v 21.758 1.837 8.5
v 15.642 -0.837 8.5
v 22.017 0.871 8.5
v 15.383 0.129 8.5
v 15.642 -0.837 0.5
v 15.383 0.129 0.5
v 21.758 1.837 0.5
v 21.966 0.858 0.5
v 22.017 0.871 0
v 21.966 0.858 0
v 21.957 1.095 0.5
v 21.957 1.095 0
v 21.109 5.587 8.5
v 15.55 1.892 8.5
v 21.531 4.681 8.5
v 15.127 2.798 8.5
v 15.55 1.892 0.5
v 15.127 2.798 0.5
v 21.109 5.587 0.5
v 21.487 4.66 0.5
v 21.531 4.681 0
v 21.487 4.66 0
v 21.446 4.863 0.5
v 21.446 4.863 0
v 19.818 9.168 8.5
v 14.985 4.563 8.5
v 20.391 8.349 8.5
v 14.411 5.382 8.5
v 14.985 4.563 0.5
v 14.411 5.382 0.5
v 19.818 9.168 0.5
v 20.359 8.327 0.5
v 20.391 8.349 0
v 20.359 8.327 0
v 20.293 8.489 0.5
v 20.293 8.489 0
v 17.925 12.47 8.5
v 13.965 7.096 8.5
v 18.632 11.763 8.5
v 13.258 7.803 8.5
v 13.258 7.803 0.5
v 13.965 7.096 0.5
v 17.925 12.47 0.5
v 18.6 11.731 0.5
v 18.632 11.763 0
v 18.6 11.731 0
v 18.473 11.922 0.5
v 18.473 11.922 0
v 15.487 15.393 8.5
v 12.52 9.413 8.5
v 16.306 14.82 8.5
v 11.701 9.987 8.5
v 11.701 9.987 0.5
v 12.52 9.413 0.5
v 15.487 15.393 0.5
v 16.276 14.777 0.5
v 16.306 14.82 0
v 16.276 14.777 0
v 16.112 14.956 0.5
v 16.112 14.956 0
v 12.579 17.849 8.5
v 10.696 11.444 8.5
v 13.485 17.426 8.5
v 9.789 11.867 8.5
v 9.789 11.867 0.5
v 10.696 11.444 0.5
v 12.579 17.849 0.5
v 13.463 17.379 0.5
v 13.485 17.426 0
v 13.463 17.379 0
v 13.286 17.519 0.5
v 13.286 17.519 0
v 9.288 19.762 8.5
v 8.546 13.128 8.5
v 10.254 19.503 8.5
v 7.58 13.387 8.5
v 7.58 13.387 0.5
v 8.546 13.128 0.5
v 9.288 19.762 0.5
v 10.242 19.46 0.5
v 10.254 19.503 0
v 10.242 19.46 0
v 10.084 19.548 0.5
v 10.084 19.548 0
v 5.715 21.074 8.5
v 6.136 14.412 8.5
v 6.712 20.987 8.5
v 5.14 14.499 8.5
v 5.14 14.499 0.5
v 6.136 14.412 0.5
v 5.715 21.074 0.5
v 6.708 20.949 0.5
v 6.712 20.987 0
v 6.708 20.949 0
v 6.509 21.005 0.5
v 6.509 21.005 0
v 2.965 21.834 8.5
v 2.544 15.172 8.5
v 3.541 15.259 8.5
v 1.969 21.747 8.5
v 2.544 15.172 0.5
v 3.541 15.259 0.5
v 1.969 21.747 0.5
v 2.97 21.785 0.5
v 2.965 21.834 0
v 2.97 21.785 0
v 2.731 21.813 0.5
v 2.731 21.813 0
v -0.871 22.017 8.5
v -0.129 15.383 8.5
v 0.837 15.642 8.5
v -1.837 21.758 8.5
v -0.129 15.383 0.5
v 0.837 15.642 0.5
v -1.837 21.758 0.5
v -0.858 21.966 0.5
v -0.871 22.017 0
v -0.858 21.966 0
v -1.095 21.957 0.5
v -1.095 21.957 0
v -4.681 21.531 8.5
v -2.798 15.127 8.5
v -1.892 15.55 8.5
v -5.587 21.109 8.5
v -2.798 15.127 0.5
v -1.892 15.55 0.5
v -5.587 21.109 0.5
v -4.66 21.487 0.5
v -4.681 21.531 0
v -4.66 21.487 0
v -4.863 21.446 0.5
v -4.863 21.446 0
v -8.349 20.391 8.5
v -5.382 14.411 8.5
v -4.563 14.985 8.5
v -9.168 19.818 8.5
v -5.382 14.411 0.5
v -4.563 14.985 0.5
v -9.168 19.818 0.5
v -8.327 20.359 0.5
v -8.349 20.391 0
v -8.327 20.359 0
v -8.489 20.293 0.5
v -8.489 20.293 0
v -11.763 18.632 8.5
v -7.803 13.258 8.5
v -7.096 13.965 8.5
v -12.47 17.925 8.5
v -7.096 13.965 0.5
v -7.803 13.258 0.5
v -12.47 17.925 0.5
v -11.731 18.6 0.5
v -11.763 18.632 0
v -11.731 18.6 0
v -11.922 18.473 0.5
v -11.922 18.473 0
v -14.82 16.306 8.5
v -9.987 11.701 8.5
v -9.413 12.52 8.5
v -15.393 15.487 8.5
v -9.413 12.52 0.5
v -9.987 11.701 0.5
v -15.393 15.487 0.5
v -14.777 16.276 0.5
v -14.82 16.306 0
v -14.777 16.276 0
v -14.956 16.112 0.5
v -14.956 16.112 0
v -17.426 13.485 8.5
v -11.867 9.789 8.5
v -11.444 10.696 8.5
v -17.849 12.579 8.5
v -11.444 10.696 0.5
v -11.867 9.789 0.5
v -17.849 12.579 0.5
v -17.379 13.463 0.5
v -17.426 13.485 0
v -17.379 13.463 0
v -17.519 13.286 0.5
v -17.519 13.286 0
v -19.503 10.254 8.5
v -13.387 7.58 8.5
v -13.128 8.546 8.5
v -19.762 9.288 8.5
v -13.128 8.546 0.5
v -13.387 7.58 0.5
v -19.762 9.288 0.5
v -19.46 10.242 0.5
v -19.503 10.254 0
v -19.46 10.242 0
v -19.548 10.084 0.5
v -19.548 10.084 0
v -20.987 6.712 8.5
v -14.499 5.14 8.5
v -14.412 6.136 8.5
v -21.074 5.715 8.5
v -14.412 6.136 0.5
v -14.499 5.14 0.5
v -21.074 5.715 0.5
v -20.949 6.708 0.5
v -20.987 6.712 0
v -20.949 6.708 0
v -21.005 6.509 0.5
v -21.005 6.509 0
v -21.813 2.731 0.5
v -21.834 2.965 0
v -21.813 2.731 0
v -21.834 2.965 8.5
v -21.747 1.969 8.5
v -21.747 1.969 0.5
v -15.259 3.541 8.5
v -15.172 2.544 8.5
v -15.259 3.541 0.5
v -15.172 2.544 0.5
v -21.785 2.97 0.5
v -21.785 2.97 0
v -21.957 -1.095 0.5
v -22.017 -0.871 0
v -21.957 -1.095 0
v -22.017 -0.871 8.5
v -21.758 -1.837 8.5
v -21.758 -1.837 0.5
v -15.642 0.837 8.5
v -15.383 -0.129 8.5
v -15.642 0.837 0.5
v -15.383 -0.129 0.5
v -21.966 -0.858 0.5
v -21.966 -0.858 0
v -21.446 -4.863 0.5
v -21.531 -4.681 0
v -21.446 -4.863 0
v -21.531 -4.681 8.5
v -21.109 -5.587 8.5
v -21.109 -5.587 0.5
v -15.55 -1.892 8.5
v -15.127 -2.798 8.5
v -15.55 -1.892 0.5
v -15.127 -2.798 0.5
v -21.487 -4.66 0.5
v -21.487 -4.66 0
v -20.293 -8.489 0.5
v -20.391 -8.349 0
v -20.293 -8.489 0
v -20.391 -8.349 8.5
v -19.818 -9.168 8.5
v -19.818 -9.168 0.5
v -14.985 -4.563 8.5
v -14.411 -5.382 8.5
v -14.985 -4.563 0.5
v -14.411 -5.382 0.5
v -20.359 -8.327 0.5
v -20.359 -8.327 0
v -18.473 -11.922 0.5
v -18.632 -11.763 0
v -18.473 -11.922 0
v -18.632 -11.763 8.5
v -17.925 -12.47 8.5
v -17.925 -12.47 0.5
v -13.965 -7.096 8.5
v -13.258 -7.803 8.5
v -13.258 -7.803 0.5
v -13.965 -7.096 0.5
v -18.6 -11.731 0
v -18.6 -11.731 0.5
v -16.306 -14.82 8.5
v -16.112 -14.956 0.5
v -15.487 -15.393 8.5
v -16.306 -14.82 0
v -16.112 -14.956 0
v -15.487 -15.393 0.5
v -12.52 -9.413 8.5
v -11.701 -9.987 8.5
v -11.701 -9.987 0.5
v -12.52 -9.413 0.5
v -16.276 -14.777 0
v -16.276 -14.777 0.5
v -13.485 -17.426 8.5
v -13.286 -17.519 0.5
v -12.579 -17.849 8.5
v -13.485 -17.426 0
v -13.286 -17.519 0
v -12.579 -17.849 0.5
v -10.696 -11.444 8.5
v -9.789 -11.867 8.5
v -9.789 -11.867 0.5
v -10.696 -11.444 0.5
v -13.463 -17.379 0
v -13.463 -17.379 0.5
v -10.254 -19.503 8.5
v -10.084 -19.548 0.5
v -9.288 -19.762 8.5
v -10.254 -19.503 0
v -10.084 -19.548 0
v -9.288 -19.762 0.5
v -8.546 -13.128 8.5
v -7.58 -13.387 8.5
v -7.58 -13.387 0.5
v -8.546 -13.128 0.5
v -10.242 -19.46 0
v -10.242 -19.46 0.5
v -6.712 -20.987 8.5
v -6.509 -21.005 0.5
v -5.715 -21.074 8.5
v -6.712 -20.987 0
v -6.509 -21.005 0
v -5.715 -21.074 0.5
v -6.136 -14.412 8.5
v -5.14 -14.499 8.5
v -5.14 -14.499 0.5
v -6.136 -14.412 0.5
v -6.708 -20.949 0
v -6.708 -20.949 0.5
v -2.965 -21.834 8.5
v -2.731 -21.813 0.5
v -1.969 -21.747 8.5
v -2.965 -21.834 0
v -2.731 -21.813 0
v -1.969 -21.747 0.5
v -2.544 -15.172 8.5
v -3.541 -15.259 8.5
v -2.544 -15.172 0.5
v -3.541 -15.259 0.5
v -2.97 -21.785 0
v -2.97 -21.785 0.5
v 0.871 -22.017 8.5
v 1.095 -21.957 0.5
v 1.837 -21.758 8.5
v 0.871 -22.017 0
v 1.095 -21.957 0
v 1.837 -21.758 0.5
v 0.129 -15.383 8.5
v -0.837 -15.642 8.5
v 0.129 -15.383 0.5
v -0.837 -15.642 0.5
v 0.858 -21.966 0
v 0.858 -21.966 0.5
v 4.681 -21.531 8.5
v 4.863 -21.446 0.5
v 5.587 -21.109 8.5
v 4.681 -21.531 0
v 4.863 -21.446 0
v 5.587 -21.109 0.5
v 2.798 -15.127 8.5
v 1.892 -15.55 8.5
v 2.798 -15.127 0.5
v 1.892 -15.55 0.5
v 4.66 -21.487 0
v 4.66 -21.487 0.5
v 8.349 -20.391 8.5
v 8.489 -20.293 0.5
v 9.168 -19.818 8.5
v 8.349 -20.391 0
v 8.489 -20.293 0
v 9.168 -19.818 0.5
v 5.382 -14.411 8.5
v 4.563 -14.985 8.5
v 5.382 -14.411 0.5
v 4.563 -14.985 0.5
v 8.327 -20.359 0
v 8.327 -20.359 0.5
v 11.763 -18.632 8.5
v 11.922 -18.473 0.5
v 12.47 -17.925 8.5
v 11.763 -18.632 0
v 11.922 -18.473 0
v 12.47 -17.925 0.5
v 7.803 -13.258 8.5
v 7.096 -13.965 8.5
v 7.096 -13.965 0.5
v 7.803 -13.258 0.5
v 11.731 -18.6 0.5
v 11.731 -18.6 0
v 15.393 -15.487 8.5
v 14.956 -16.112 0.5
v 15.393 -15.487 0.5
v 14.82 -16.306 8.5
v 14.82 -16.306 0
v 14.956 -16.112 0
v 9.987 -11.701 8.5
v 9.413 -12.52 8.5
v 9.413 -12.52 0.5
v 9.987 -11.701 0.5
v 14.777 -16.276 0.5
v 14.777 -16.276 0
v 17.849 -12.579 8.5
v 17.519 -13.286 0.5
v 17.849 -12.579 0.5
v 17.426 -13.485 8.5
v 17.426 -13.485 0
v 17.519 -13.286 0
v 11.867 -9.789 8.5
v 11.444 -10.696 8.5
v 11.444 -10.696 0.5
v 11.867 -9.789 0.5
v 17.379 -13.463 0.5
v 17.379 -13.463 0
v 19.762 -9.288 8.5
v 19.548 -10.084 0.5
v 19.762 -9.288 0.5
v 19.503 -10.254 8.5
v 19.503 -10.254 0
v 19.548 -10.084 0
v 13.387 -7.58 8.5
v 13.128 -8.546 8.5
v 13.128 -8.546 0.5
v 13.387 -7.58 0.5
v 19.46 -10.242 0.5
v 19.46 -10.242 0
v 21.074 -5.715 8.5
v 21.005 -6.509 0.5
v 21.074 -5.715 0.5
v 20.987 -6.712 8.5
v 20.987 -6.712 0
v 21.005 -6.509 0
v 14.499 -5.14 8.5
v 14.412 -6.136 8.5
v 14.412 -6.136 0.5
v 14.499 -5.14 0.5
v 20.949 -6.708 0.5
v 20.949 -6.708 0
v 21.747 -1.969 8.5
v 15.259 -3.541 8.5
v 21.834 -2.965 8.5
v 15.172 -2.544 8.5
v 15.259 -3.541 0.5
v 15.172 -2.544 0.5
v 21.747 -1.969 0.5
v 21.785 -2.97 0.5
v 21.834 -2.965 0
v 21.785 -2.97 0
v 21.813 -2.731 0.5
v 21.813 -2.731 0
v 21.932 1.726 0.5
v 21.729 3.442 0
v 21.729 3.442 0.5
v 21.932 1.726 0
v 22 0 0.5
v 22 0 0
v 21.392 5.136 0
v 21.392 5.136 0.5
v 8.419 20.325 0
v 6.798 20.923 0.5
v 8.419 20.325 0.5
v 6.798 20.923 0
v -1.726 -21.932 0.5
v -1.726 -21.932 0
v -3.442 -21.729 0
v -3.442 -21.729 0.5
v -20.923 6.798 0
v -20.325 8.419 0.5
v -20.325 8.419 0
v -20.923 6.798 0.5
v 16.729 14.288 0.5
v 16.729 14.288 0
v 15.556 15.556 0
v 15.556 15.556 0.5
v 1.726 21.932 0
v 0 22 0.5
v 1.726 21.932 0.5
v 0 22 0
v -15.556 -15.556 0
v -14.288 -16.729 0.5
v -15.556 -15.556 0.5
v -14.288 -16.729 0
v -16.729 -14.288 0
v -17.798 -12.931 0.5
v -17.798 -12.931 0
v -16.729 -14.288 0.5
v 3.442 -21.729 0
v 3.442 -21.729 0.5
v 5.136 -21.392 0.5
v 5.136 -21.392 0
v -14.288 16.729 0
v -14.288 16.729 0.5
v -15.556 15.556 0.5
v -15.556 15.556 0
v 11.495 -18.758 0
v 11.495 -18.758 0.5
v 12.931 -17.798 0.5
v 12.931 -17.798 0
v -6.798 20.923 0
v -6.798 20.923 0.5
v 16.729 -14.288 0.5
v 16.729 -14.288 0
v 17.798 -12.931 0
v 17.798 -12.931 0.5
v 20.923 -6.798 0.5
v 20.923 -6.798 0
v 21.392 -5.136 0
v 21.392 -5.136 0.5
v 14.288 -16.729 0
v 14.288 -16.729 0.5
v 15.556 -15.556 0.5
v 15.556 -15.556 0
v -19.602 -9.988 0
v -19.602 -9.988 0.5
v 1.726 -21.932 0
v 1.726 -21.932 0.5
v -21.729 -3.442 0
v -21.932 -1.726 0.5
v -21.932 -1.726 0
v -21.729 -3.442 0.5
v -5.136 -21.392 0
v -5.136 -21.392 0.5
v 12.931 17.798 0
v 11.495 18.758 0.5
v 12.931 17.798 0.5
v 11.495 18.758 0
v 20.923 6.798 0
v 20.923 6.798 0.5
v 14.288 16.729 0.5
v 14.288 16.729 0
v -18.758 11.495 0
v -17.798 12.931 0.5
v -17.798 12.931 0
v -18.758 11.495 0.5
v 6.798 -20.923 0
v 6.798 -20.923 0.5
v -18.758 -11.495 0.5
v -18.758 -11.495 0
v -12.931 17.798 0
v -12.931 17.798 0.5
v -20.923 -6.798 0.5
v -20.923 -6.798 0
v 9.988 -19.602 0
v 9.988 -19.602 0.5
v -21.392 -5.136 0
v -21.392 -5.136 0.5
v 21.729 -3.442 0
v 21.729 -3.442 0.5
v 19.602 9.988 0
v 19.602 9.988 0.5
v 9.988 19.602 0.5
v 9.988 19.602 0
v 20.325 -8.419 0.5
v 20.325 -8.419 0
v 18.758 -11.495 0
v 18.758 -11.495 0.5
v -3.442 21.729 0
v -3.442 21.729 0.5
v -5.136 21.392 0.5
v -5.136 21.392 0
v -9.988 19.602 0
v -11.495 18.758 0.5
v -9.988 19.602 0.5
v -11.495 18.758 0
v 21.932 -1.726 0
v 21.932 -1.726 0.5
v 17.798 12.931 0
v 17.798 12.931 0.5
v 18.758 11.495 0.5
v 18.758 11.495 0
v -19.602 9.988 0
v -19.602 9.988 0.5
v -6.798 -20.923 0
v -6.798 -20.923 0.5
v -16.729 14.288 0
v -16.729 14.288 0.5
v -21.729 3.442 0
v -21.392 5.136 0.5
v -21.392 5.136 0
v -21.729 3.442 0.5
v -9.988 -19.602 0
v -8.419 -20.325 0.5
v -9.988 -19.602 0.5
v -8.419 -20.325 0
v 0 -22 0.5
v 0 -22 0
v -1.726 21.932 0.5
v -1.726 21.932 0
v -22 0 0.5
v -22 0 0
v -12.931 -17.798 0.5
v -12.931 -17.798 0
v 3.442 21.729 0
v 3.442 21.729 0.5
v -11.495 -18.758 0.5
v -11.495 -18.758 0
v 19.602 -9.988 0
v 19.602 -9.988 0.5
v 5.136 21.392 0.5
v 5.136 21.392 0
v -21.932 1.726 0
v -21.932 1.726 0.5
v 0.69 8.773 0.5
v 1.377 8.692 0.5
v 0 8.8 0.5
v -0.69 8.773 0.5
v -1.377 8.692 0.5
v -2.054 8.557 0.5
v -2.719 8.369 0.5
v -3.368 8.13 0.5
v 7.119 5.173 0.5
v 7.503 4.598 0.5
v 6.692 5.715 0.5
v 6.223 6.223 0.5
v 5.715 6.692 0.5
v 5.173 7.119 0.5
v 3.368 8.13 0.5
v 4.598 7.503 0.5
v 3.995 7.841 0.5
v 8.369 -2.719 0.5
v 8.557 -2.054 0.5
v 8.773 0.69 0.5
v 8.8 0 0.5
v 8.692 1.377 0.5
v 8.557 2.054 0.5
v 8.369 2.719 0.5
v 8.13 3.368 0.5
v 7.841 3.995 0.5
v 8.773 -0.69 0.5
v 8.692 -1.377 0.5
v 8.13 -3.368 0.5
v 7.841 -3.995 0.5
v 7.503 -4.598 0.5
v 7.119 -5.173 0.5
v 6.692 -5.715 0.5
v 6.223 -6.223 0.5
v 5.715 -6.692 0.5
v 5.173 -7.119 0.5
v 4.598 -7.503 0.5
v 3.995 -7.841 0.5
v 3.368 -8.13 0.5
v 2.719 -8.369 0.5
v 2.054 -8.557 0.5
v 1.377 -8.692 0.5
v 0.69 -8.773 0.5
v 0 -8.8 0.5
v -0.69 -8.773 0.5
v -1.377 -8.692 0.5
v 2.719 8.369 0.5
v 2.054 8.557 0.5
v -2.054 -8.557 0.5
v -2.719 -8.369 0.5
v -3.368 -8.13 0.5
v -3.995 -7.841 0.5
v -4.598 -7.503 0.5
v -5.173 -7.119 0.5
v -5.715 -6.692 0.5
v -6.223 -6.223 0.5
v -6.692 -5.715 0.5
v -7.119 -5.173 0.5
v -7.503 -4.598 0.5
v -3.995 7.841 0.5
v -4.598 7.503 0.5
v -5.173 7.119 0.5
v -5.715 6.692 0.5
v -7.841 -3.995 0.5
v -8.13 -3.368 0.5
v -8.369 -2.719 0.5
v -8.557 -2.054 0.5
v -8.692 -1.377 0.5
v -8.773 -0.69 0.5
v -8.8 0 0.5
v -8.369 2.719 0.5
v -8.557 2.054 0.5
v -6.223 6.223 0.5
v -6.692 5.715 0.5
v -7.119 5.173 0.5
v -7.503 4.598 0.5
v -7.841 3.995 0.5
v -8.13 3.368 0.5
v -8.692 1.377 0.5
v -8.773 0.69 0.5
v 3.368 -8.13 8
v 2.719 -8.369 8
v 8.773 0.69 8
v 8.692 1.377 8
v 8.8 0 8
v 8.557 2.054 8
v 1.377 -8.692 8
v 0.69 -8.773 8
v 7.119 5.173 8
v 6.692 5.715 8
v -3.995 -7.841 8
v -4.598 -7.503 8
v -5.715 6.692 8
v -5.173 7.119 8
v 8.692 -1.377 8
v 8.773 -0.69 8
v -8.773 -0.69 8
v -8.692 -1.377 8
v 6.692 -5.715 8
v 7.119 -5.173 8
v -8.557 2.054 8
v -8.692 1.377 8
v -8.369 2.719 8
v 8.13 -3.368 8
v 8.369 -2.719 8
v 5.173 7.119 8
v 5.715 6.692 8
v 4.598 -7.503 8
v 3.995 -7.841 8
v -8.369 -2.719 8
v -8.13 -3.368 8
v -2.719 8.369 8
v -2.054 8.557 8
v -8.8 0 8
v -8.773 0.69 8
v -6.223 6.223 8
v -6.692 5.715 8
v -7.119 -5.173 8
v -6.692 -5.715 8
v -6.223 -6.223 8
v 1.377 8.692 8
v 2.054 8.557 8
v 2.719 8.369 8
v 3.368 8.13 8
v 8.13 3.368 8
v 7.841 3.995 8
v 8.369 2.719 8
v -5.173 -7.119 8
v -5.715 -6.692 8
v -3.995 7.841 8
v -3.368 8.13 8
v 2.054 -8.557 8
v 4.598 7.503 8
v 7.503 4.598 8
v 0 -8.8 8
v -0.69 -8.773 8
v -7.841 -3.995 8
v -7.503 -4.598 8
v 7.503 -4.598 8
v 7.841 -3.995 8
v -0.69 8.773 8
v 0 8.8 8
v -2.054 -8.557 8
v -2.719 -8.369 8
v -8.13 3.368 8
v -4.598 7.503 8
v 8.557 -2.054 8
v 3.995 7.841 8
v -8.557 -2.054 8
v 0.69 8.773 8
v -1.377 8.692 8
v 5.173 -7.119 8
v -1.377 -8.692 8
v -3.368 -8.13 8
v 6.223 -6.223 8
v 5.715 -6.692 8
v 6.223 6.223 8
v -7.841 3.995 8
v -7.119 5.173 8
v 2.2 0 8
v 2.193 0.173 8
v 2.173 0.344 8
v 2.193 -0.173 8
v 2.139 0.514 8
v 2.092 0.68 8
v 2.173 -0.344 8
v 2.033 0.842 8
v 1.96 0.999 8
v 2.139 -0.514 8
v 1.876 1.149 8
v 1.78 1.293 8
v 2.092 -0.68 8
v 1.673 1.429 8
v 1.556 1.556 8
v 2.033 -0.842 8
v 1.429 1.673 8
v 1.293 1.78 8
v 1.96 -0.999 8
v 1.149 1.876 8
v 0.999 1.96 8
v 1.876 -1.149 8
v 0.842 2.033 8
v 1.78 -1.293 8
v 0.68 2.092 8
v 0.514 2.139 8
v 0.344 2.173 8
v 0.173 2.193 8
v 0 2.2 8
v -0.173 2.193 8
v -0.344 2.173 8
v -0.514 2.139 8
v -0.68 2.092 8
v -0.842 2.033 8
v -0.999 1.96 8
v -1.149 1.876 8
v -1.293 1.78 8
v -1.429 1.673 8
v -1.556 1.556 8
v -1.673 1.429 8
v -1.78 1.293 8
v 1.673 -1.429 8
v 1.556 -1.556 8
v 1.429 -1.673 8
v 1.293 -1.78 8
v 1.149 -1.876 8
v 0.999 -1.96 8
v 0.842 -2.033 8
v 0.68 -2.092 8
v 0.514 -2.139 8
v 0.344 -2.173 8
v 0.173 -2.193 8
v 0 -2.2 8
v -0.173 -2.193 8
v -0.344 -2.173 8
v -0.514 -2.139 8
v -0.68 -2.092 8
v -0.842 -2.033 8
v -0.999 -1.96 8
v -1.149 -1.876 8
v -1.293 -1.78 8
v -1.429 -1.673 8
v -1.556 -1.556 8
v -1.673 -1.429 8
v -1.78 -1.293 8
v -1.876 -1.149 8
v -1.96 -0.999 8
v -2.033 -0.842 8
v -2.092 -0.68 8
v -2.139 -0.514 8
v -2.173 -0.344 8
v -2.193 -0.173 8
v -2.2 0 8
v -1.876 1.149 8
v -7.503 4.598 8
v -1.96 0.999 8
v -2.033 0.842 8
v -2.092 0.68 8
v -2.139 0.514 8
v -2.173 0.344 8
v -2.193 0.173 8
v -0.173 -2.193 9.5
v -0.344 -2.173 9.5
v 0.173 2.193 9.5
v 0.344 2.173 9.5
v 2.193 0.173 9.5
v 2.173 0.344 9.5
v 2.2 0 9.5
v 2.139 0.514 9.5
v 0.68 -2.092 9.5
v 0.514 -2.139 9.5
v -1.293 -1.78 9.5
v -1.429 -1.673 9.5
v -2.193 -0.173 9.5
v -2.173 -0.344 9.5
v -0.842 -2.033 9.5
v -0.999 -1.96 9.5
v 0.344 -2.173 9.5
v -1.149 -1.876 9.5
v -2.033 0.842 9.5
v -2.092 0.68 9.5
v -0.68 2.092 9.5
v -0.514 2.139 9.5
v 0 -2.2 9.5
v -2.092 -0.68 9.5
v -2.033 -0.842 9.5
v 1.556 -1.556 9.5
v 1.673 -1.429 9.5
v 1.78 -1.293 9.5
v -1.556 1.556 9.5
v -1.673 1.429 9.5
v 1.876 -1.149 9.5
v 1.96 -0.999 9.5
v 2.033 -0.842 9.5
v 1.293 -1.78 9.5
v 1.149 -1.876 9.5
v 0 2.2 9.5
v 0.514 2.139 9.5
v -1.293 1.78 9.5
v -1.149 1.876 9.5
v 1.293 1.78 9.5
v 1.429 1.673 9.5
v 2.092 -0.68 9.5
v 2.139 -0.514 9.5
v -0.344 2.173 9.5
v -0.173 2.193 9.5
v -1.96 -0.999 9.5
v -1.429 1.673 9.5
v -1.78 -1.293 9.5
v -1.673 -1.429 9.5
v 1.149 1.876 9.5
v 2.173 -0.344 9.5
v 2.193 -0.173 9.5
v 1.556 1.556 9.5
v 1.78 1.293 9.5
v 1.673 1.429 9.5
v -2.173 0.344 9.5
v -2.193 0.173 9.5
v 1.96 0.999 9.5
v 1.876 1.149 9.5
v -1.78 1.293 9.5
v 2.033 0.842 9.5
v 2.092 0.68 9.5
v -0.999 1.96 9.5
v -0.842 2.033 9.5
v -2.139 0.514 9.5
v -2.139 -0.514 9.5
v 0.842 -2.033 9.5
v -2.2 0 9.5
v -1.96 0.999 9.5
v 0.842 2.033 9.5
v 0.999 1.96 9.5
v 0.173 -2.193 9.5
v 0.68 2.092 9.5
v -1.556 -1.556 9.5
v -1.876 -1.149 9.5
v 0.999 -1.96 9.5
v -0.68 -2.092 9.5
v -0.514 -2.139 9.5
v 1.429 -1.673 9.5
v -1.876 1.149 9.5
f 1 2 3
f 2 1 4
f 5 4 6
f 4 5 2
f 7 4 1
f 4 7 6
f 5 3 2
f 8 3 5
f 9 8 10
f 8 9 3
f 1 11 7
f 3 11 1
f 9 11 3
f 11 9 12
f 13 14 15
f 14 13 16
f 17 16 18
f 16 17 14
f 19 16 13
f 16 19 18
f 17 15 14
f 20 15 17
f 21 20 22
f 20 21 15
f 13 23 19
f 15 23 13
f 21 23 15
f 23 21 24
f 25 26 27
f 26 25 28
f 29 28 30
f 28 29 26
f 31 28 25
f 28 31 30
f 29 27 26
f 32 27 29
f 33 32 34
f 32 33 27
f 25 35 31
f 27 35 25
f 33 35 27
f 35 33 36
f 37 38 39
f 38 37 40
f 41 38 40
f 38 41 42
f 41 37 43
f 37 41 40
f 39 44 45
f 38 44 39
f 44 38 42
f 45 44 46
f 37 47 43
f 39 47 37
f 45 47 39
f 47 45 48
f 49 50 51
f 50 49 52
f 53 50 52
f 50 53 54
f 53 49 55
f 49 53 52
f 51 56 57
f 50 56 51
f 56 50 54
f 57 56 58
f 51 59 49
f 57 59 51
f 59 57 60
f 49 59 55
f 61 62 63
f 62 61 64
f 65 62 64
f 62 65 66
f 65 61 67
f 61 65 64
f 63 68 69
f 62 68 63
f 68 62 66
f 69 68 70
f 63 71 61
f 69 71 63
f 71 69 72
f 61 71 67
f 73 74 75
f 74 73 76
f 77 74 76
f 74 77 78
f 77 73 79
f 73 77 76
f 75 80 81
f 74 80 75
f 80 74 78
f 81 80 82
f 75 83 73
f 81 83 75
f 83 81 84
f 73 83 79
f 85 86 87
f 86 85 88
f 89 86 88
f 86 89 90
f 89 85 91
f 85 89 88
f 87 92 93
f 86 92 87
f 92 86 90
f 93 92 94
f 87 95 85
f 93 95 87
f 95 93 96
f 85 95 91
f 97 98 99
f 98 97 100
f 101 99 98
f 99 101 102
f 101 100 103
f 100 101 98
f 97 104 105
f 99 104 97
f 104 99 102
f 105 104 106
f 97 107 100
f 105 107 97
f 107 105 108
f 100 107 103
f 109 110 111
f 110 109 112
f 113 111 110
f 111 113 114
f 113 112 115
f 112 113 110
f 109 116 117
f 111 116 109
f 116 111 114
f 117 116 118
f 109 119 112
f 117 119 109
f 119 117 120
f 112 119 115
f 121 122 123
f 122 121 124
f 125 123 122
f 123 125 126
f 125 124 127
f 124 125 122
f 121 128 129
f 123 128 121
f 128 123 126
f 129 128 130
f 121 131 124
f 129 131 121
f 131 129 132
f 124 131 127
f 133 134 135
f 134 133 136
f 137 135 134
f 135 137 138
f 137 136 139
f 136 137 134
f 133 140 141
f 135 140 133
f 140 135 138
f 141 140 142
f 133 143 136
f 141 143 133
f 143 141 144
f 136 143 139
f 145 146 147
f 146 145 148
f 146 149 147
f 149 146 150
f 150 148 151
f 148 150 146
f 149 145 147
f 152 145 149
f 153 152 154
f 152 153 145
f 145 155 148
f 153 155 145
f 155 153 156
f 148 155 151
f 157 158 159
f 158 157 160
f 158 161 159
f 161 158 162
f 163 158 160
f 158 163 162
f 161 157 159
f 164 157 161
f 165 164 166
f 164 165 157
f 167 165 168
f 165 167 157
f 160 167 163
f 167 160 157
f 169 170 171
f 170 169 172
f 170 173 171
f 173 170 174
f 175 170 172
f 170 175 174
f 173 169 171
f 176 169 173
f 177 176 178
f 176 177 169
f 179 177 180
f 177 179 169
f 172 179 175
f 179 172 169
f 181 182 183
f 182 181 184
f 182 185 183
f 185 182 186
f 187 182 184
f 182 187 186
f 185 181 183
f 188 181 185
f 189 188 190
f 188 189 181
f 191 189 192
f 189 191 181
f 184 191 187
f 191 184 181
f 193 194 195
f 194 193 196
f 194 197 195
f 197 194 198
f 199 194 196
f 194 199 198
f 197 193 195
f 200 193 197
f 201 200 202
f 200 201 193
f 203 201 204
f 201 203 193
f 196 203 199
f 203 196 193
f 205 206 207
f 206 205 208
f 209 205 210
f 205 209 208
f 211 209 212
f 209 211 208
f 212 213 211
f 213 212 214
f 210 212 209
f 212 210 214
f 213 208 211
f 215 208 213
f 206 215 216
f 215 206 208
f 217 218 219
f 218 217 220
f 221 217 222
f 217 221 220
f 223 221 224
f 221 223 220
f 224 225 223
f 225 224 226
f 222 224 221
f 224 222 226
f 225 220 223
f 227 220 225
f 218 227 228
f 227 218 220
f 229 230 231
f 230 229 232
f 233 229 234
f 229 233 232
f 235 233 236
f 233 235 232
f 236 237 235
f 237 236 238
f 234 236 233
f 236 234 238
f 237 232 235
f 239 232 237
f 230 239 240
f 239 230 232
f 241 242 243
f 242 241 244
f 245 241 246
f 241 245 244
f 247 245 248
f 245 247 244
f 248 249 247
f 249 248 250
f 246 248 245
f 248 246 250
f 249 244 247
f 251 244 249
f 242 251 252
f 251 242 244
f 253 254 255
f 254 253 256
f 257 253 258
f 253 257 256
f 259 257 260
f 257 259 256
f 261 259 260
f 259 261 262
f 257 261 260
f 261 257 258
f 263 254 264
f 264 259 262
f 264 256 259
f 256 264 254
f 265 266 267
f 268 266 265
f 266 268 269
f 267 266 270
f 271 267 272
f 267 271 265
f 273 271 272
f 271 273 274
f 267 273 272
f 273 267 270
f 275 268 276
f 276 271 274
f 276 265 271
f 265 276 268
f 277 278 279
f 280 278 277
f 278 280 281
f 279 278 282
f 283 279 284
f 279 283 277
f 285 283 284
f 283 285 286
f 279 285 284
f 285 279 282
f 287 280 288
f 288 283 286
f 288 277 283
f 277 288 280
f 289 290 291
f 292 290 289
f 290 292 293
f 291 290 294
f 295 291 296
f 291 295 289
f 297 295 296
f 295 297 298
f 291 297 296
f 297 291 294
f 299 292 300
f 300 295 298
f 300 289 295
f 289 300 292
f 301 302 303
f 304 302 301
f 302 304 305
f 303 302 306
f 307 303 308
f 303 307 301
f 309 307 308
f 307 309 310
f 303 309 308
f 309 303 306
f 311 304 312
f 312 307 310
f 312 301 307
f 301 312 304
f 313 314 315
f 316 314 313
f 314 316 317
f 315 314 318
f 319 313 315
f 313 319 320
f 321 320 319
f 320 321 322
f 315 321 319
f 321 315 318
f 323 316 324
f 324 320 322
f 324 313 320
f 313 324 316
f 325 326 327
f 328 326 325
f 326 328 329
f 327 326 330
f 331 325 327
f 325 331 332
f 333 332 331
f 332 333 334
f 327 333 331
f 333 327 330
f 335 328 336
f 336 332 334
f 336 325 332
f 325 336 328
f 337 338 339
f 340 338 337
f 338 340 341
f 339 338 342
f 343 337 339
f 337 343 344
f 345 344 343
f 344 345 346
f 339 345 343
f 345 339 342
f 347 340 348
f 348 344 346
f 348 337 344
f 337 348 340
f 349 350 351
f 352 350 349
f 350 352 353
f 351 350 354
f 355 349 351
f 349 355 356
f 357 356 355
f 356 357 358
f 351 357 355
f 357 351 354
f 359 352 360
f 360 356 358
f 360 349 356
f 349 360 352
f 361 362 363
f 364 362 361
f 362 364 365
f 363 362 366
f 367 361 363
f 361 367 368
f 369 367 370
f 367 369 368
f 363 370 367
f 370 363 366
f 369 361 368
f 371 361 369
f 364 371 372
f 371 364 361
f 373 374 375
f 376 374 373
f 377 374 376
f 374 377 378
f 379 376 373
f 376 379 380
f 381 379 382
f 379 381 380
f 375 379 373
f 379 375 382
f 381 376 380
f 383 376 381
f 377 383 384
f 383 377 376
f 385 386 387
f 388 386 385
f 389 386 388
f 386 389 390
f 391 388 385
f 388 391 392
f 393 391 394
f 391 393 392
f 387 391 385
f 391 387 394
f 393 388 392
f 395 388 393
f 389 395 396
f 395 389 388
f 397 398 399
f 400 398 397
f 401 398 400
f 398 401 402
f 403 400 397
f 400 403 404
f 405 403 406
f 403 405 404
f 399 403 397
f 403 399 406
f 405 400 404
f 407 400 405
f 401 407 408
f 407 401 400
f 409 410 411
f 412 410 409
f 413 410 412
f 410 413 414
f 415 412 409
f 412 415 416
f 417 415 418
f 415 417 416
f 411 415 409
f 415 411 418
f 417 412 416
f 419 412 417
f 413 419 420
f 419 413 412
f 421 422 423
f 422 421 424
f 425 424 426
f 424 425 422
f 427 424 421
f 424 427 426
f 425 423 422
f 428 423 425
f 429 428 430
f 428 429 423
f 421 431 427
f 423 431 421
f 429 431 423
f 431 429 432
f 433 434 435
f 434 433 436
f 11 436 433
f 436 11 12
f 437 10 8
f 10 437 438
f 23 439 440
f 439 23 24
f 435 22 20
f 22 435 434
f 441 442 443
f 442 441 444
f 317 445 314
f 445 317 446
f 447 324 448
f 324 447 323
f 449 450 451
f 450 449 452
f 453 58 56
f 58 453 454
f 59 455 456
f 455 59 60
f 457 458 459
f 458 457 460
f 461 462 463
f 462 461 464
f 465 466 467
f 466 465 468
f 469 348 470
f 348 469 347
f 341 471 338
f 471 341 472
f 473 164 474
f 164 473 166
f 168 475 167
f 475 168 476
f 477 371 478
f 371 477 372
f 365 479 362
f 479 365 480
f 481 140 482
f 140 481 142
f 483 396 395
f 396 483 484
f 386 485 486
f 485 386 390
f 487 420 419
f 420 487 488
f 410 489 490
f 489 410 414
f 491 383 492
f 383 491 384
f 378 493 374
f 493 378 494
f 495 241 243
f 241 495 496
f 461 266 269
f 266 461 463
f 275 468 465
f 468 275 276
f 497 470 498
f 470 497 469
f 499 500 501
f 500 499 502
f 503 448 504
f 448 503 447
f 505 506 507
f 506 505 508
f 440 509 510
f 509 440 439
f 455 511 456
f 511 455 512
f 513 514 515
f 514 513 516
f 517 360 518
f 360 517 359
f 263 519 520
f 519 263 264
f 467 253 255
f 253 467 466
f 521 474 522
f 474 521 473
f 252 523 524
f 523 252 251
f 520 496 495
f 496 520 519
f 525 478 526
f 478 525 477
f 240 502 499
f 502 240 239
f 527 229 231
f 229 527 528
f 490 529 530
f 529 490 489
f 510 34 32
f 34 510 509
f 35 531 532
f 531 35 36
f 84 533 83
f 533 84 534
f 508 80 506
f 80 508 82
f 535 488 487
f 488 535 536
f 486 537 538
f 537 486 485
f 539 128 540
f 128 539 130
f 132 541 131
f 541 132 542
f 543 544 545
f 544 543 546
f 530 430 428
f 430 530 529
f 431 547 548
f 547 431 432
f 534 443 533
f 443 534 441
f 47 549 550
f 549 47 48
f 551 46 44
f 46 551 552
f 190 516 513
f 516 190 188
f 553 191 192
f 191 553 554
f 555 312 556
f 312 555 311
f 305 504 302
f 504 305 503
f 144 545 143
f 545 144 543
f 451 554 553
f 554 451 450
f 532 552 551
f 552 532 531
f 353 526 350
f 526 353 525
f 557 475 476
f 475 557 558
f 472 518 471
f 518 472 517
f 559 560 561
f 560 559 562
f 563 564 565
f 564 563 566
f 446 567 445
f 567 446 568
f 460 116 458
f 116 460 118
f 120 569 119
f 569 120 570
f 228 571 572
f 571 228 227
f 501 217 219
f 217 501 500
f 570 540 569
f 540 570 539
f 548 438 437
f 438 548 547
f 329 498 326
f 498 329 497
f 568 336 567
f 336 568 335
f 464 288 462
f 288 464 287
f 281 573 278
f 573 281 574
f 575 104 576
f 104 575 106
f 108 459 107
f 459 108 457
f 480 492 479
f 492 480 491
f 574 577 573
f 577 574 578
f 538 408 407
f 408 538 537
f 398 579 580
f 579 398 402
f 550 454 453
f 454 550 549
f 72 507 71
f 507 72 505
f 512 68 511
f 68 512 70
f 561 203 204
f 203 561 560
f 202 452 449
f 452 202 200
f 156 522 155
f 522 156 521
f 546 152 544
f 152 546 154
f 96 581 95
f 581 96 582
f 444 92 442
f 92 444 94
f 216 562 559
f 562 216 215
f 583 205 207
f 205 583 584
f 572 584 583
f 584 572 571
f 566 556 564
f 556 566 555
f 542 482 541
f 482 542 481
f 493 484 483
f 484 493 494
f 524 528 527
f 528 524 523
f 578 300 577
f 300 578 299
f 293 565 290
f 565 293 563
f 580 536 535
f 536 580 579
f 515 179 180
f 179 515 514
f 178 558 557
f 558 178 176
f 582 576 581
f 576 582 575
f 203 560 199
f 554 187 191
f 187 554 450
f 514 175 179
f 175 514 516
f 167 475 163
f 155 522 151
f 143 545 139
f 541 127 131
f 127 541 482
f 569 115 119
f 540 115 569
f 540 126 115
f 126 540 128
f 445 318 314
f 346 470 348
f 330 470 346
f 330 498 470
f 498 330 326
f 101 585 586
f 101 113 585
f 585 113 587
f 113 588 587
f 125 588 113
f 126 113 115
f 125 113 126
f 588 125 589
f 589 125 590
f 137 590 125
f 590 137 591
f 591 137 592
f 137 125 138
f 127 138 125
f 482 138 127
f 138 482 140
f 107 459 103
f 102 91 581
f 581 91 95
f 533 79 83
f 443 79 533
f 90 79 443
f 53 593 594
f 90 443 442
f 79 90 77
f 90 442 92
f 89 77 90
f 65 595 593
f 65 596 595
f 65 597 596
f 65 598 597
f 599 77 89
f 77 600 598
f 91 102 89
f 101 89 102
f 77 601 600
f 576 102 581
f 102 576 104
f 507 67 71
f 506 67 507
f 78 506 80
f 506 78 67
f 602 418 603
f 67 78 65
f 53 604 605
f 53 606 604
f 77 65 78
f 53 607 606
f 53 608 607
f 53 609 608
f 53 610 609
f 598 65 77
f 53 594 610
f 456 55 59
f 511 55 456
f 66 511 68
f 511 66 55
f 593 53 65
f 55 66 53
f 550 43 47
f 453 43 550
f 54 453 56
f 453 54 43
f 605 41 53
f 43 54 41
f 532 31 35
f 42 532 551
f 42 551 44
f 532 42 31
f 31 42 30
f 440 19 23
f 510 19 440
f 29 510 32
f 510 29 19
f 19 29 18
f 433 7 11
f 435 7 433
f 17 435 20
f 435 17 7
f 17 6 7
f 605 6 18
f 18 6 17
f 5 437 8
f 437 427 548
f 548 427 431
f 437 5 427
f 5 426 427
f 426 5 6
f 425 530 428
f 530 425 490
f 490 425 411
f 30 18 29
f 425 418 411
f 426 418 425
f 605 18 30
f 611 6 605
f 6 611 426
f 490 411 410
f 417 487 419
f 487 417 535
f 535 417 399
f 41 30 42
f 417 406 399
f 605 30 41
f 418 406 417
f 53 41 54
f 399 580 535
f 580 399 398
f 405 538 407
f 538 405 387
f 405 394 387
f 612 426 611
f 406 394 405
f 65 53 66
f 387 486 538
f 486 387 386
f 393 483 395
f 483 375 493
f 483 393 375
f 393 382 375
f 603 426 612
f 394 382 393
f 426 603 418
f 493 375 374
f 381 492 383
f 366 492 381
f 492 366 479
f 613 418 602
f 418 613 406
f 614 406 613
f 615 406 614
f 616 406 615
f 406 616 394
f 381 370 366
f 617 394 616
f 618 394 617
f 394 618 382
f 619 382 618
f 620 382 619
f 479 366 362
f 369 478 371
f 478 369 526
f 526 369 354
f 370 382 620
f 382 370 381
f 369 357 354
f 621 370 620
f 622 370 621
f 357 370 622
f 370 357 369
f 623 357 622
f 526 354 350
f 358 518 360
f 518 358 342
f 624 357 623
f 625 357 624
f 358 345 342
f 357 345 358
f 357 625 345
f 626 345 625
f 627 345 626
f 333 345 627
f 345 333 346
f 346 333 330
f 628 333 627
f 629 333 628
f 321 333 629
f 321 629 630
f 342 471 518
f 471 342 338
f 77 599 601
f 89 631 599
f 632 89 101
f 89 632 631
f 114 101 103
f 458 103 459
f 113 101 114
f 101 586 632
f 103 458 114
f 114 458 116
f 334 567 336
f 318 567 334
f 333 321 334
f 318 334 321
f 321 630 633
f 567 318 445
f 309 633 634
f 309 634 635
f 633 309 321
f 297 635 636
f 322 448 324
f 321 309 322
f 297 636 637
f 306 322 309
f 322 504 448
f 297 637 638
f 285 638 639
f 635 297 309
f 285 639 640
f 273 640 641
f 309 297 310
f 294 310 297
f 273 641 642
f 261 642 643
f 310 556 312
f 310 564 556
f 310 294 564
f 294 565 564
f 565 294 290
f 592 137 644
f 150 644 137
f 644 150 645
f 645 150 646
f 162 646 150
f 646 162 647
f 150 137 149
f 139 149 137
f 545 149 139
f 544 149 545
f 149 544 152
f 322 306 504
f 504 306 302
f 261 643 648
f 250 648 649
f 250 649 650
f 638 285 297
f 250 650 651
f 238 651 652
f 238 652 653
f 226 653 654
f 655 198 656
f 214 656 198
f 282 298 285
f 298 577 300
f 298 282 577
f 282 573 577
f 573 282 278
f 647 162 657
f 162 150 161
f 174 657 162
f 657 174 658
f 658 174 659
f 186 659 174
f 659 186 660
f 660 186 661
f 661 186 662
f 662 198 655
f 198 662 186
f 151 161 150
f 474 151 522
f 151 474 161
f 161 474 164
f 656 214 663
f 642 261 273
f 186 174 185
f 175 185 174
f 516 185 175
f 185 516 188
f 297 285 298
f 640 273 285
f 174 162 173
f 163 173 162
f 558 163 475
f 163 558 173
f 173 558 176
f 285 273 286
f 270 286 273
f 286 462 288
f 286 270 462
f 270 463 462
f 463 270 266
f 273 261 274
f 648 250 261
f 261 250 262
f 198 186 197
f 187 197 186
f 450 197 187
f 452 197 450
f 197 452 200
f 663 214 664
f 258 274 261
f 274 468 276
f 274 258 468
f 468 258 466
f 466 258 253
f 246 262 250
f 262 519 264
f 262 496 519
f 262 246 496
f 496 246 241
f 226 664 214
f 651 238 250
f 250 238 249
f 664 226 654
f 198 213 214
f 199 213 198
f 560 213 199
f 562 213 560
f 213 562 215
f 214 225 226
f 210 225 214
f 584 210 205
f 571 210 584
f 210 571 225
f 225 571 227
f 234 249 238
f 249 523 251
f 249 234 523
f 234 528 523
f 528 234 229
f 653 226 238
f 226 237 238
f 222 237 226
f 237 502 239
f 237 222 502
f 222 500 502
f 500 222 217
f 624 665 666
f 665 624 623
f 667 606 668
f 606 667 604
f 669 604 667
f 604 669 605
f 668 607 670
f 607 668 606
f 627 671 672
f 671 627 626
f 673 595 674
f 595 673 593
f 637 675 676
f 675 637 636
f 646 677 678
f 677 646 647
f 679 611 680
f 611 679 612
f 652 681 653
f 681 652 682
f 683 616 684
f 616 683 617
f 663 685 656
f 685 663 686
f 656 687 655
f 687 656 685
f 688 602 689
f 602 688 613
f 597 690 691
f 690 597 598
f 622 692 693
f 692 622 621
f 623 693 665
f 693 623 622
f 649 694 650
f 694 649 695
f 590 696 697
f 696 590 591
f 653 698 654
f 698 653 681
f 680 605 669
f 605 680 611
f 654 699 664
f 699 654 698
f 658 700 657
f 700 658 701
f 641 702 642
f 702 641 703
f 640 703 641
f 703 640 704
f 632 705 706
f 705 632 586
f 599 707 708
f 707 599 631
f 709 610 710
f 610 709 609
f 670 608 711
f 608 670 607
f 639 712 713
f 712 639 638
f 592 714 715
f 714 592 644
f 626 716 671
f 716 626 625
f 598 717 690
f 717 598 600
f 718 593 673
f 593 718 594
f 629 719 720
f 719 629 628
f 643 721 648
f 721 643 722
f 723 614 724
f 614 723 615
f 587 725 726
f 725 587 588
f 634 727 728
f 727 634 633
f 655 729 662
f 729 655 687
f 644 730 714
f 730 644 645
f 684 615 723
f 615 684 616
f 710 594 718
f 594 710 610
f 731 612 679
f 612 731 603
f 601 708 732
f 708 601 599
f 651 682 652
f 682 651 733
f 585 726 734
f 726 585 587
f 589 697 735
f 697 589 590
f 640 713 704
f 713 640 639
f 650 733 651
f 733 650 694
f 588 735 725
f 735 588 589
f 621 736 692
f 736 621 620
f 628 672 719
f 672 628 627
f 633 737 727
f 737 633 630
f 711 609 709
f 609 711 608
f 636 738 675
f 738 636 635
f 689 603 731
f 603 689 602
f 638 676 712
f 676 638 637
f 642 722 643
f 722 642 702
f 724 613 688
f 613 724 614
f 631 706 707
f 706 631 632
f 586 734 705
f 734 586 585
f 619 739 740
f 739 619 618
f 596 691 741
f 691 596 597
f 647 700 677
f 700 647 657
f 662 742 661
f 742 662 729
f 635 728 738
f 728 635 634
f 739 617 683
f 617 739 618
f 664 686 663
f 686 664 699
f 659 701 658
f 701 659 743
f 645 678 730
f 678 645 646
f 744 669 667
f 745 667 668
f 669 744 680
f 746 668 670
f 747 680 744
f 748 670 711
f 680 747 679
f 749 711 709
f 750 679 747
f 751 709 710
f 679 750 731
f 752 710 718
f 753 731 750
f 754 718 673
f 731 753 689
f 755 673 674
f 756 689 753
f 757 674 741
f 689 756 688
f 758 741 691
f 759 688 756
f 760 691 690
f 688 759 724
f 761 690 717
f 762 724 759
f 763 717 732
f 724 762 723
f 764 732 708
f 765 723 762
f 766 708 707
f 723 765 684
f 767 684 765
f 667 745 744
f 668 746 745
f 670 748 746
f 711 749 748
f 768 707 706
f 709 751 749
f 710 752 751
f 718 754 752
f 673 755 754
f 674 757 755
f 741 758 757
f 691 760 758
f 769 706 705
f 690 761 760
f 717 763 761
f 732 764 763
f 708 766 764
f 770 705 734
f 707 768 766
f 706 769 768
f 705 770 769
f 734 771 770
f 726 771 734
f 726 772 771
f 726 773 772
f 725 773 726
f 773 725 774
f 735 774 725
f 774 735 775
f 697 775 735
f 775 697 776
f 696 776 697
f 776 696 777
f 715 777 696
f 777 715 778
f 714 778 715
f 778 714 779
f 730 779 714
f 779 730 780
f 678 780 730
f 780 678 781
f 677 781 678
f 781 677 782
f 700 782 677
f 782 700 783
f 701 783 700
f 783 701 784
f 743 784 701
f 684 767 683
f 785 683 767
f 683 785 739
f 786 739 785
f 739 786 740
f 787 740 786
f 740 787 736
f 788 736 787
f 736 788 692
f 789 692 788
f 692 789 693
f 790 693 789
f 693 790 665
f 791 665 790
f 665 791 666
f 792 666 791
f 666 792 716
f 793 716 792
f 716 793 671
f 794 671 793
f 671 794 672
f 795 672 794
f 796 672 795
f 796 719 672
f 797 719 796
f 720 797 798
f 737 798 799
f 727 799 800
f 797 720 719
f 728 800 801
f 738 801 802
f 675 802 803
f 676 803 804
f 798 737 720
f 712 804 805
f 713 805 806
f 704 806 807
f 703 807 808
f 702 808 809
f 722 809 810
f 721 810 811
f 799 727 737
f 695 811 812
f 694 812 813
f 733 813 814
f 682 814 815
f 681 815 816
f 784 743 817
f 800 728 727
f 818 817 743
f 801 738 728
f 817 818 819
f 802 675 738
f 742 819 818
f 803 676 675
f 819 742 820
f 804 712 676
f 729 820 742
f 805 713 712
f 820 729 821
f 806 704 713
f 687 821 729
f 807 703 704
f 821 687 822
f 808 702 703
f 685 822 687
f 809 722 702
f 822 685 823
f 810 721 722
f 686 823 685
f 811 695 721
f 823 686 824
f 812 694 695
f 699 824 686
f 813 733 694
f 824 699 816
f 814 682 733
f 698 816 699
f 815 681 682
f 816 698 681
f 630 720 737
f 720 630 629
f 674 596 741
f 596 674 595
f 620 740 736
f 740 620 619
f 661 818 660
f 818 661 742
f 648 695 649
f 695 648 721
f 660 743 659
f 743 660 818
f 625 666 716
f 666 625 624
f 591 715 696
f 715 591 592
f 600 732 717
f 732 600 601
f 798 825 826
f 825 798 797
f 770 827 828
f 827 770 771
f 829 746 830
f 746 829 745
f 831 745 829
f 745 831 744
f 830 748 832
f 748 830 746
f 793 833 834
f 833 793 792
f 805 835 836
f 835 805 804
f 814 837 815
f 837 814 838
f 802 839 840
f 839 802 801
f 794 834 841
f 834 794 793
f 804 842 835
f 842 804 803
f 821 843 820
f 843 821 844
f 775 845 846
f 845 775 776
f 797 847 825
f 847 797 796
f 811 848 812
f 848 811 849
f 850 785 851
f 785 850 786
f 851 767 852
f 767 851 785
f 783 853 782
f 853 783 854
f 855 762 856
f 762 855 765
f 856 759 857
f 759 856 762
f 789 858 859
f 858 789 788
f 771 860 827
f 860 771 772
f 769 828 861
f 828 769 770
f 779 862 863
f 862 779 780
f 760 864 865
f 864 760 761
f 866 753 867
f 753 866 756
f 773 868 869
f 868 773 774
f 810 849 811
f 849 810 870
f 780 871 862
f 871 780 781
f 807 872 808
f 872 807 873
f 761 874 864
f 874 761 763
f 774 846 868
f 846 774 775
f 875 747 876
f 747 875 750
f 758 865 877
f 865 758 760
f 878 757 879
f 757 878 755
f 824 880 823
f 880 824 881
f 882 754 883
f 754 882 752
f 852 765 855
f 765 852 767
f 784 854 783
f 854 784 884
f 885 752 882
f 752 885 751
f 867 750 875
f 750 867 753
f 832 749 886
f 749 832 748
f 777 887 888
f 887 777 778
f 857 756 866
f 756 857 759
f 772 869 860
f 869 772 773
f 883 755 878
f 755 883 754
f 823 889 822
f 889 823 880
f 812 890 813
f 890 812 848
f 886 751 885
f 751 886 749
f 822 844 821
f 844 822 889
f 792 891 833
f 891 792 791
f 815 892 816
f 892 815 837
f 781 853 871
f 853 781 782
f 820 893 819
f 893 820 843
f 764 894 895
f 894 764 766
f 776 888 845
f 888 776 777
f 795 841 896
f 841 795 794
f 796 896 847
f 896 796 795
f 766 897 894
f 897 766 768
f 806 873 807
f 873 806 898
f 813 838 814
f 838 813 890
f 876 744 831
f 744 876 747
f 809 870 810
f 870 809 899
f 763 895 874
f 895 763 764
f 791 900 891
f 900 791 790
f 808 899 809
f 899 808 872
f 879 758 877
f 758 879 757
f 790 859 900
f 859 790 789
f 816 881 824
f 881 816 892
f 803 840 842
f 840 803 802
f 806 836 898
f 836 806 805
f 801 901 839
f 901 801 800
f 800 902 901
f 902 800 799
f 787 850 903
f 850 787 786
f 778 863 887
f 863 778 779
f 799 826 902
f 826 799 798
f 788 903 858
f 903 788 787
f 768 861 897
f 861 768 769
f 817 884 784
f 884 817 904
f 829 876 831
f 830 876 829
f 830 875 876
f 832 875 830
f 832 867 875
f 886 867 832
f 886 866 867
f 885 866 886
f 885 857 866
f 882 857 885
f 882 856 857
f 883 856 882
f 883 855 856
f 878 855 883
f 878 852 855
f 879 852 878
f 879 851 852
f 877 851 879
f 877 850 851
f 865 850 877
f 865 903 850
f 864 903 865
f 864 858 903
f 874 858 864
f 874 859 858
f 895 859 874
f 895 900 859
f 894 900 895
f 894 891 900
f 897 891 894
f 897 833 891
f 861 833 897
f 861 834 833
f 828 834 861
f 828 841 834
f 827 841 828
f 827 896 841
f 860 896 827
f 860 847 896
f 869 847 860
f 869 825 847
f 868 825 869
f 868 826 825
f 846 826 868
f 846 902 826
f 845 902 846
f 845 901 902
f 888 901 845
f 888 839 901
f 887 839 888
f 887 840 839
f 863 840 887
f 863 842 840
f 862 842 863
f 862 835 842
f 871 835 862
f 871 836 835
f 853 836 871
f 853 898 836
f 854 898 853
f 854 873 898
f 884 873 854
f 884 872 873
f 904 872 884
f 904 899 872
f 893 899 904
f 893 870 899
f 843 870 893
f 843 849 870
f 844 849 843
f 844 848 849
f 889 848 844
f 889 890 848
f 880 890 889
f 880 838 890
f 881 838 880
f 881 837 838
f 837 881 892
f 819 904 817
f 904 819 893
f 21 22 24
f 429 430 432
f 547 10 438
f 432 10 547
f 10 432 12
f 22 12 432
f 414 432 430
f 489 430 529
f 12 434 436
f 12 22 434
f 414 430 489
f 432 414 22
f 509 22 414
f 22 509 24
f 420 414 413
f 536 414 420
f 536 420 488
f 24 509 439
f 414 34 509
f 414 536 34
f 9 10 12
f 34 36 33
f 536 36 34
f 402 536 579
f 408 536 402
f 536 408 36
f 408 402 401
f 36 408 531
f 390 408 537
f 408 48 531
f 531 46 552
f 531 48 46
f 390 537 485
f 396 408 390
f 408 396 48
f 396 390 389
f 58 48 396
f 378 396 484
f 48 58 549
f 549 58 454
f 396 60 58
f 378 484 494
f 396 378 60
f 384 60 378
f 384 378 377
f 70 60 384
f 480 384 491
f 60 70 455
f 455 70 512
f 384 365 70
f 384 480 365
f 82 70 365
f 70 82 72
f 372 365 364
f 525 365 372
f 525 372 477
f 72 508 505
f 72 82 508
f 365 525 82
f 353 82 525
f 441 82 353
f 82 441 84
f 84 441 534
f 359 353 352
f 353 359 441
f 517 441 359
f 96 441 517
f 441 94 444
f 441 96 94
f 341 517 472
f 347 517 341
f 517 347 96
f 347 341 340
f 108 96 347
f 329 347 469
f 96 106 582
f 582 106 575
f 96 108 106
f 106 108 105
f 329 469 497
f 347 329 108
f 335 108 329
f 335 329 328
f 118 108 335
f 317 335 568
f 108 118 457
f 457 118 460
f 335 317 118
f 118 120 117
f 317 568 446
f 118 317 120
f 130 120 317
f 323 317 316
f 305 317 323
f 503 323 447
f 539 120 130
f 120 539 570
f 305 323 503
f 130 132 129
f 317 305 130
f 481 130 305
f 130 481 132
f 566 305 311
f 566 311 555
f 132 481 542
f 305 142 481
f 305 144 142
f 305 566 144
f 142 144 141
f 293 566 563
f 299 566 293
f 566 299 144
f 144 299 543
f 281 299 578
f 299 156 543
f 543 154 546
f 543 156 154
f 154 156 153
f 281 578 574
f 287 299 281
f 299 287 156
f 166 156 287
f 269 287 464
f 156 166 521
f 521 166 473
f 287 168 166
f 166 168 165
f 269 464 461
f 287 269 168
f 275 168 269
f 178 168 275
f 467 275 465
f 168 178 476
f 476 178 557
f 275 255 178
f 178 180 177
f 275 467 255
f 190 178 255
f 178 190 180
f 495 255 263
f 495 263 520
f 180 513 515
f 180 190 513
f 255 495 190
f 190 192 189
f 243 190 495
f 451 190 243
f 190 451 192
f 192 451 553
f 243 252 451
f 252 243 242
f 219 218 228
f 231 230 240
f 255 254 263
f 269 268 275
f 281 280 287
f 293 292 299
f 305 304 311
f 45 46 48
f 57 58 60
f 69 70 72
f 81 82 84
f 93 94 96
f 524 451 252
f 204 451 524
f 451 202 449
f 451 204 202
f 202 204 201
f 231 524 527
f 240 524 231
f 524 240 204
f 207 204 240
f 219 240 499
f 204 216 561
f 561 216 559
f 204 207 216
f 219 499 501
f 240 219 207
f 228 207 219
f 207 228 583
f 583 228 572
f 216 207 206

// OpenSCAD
/*
*
* 50mm 12V Blower Proxy Model
*
* Author: R Sutherland
*
* License: CC BY-SA 4.0
* License URL: https://creativecommons.org/licenses/by-sa/4.0/
*
*/

$fn = 80;

module c_fan(radius, height) {

   color("red") cylinder(r=radius,h=1,center=true);

   rotate([0,0,$t*10])
   for (theta= [0:10:350]) {
       rotate([0.0,0.0,theta]){
           translate([radius-(radius*0.15),0.5,0.0]) rotate([0,0,15]) cube([radius*0.3,1.0,height-2.0],center=true);
       }
   }

   color("orange") cylinder(r=radius*0.4,h=height-3,center=true);
   color("black") cylinder(r=radius*0.1,h=height,center=true);

}

module main_box(){
   difference(){
       cube([50.0,50.0,20.0],center=true);
       cylinder(r=18.0,0.0, h=22.0,center=true);
       cylinder(r=23.5, h=17.0,center=true);
       translate([12,13.5,0.0]) cube([23.0,27.0,17.0],center=true);
       rotate_extrude () {
           translate([25,-11,0]) square(22);
       }
   }
   
  difference(){
       translate([12,12.5,0])  cube([26.0,25.0,20.0],center=true);
       translate([12.0,12.5,0])  cube([23.5,26.0,17.0],center=true);
       cylinder(r=18.0,0.0, h=22.0,center=true);
   } 
}

module chamber() {
    difference(){
        main_box();
        translate([0,0,10.9]){
            cube(size=[100,100,5], center=true);
        }   
    }
}

module bottom_lock() {
    difference(){
        translate([0, 0, 0]){ // wrapper
            translate([0,0,8.5]){
                cylinder(r=20,h=1.5);
            }
            intersection(){
                main_box();
                translate([0,0,11]){
                    cube(size=[100,100,5], center=true);
                }
            } 
        }
       cylinder(r=4,h=20);
    }
} 

difference(){
    c_fan(radius=22.0, height=19.0);    
translate([0,0,-50]){
        cylinder(r=50,h=50);
    }
}
    
/*
module blower_50mm(){

   c_fan(radius=22.0, height=19.0);

    difference(){
        hull(){
           translate([21.75,-20.00,0]) cylinder(r=3.25,h=21.0,center=true);
           translate([-21.75,19.75,0]) cylinder(r=3.25,h=21.0,center=true);
        }
       translate([21.75,-20.00,0]) cylinder(r=2.25,h=21.5,center=true);
       translate([-21.75,19.75,0]) cylinder(r=2.25,h=21.5,center=true);
       cylinder(r=24, h=19.0,center=true);
   }

   difference(){
       translate([12,12.5,0])  cube([26.0,25.0,20.0],center=true);
       translate([12.0,12.5,0])  cube([23.5,26.0,17.0],center=true);
       cylinder(r=18.0,0.0, h=22.0,center=true);
   }

   difference(){
       cube([50.0,50.0,20.0],center=true);
       cylinder(r=18.0,0.0, h=22.0,center=true);
       cylinder(r=23.5, h=17.0,center=true);
       translate([12,13.5,0.0]) cube([23.0,27.0,17.0],center=true);
       rotate_extrude () {
           translate([25,-11,0]) square(22);
       }
   }
}
*/
